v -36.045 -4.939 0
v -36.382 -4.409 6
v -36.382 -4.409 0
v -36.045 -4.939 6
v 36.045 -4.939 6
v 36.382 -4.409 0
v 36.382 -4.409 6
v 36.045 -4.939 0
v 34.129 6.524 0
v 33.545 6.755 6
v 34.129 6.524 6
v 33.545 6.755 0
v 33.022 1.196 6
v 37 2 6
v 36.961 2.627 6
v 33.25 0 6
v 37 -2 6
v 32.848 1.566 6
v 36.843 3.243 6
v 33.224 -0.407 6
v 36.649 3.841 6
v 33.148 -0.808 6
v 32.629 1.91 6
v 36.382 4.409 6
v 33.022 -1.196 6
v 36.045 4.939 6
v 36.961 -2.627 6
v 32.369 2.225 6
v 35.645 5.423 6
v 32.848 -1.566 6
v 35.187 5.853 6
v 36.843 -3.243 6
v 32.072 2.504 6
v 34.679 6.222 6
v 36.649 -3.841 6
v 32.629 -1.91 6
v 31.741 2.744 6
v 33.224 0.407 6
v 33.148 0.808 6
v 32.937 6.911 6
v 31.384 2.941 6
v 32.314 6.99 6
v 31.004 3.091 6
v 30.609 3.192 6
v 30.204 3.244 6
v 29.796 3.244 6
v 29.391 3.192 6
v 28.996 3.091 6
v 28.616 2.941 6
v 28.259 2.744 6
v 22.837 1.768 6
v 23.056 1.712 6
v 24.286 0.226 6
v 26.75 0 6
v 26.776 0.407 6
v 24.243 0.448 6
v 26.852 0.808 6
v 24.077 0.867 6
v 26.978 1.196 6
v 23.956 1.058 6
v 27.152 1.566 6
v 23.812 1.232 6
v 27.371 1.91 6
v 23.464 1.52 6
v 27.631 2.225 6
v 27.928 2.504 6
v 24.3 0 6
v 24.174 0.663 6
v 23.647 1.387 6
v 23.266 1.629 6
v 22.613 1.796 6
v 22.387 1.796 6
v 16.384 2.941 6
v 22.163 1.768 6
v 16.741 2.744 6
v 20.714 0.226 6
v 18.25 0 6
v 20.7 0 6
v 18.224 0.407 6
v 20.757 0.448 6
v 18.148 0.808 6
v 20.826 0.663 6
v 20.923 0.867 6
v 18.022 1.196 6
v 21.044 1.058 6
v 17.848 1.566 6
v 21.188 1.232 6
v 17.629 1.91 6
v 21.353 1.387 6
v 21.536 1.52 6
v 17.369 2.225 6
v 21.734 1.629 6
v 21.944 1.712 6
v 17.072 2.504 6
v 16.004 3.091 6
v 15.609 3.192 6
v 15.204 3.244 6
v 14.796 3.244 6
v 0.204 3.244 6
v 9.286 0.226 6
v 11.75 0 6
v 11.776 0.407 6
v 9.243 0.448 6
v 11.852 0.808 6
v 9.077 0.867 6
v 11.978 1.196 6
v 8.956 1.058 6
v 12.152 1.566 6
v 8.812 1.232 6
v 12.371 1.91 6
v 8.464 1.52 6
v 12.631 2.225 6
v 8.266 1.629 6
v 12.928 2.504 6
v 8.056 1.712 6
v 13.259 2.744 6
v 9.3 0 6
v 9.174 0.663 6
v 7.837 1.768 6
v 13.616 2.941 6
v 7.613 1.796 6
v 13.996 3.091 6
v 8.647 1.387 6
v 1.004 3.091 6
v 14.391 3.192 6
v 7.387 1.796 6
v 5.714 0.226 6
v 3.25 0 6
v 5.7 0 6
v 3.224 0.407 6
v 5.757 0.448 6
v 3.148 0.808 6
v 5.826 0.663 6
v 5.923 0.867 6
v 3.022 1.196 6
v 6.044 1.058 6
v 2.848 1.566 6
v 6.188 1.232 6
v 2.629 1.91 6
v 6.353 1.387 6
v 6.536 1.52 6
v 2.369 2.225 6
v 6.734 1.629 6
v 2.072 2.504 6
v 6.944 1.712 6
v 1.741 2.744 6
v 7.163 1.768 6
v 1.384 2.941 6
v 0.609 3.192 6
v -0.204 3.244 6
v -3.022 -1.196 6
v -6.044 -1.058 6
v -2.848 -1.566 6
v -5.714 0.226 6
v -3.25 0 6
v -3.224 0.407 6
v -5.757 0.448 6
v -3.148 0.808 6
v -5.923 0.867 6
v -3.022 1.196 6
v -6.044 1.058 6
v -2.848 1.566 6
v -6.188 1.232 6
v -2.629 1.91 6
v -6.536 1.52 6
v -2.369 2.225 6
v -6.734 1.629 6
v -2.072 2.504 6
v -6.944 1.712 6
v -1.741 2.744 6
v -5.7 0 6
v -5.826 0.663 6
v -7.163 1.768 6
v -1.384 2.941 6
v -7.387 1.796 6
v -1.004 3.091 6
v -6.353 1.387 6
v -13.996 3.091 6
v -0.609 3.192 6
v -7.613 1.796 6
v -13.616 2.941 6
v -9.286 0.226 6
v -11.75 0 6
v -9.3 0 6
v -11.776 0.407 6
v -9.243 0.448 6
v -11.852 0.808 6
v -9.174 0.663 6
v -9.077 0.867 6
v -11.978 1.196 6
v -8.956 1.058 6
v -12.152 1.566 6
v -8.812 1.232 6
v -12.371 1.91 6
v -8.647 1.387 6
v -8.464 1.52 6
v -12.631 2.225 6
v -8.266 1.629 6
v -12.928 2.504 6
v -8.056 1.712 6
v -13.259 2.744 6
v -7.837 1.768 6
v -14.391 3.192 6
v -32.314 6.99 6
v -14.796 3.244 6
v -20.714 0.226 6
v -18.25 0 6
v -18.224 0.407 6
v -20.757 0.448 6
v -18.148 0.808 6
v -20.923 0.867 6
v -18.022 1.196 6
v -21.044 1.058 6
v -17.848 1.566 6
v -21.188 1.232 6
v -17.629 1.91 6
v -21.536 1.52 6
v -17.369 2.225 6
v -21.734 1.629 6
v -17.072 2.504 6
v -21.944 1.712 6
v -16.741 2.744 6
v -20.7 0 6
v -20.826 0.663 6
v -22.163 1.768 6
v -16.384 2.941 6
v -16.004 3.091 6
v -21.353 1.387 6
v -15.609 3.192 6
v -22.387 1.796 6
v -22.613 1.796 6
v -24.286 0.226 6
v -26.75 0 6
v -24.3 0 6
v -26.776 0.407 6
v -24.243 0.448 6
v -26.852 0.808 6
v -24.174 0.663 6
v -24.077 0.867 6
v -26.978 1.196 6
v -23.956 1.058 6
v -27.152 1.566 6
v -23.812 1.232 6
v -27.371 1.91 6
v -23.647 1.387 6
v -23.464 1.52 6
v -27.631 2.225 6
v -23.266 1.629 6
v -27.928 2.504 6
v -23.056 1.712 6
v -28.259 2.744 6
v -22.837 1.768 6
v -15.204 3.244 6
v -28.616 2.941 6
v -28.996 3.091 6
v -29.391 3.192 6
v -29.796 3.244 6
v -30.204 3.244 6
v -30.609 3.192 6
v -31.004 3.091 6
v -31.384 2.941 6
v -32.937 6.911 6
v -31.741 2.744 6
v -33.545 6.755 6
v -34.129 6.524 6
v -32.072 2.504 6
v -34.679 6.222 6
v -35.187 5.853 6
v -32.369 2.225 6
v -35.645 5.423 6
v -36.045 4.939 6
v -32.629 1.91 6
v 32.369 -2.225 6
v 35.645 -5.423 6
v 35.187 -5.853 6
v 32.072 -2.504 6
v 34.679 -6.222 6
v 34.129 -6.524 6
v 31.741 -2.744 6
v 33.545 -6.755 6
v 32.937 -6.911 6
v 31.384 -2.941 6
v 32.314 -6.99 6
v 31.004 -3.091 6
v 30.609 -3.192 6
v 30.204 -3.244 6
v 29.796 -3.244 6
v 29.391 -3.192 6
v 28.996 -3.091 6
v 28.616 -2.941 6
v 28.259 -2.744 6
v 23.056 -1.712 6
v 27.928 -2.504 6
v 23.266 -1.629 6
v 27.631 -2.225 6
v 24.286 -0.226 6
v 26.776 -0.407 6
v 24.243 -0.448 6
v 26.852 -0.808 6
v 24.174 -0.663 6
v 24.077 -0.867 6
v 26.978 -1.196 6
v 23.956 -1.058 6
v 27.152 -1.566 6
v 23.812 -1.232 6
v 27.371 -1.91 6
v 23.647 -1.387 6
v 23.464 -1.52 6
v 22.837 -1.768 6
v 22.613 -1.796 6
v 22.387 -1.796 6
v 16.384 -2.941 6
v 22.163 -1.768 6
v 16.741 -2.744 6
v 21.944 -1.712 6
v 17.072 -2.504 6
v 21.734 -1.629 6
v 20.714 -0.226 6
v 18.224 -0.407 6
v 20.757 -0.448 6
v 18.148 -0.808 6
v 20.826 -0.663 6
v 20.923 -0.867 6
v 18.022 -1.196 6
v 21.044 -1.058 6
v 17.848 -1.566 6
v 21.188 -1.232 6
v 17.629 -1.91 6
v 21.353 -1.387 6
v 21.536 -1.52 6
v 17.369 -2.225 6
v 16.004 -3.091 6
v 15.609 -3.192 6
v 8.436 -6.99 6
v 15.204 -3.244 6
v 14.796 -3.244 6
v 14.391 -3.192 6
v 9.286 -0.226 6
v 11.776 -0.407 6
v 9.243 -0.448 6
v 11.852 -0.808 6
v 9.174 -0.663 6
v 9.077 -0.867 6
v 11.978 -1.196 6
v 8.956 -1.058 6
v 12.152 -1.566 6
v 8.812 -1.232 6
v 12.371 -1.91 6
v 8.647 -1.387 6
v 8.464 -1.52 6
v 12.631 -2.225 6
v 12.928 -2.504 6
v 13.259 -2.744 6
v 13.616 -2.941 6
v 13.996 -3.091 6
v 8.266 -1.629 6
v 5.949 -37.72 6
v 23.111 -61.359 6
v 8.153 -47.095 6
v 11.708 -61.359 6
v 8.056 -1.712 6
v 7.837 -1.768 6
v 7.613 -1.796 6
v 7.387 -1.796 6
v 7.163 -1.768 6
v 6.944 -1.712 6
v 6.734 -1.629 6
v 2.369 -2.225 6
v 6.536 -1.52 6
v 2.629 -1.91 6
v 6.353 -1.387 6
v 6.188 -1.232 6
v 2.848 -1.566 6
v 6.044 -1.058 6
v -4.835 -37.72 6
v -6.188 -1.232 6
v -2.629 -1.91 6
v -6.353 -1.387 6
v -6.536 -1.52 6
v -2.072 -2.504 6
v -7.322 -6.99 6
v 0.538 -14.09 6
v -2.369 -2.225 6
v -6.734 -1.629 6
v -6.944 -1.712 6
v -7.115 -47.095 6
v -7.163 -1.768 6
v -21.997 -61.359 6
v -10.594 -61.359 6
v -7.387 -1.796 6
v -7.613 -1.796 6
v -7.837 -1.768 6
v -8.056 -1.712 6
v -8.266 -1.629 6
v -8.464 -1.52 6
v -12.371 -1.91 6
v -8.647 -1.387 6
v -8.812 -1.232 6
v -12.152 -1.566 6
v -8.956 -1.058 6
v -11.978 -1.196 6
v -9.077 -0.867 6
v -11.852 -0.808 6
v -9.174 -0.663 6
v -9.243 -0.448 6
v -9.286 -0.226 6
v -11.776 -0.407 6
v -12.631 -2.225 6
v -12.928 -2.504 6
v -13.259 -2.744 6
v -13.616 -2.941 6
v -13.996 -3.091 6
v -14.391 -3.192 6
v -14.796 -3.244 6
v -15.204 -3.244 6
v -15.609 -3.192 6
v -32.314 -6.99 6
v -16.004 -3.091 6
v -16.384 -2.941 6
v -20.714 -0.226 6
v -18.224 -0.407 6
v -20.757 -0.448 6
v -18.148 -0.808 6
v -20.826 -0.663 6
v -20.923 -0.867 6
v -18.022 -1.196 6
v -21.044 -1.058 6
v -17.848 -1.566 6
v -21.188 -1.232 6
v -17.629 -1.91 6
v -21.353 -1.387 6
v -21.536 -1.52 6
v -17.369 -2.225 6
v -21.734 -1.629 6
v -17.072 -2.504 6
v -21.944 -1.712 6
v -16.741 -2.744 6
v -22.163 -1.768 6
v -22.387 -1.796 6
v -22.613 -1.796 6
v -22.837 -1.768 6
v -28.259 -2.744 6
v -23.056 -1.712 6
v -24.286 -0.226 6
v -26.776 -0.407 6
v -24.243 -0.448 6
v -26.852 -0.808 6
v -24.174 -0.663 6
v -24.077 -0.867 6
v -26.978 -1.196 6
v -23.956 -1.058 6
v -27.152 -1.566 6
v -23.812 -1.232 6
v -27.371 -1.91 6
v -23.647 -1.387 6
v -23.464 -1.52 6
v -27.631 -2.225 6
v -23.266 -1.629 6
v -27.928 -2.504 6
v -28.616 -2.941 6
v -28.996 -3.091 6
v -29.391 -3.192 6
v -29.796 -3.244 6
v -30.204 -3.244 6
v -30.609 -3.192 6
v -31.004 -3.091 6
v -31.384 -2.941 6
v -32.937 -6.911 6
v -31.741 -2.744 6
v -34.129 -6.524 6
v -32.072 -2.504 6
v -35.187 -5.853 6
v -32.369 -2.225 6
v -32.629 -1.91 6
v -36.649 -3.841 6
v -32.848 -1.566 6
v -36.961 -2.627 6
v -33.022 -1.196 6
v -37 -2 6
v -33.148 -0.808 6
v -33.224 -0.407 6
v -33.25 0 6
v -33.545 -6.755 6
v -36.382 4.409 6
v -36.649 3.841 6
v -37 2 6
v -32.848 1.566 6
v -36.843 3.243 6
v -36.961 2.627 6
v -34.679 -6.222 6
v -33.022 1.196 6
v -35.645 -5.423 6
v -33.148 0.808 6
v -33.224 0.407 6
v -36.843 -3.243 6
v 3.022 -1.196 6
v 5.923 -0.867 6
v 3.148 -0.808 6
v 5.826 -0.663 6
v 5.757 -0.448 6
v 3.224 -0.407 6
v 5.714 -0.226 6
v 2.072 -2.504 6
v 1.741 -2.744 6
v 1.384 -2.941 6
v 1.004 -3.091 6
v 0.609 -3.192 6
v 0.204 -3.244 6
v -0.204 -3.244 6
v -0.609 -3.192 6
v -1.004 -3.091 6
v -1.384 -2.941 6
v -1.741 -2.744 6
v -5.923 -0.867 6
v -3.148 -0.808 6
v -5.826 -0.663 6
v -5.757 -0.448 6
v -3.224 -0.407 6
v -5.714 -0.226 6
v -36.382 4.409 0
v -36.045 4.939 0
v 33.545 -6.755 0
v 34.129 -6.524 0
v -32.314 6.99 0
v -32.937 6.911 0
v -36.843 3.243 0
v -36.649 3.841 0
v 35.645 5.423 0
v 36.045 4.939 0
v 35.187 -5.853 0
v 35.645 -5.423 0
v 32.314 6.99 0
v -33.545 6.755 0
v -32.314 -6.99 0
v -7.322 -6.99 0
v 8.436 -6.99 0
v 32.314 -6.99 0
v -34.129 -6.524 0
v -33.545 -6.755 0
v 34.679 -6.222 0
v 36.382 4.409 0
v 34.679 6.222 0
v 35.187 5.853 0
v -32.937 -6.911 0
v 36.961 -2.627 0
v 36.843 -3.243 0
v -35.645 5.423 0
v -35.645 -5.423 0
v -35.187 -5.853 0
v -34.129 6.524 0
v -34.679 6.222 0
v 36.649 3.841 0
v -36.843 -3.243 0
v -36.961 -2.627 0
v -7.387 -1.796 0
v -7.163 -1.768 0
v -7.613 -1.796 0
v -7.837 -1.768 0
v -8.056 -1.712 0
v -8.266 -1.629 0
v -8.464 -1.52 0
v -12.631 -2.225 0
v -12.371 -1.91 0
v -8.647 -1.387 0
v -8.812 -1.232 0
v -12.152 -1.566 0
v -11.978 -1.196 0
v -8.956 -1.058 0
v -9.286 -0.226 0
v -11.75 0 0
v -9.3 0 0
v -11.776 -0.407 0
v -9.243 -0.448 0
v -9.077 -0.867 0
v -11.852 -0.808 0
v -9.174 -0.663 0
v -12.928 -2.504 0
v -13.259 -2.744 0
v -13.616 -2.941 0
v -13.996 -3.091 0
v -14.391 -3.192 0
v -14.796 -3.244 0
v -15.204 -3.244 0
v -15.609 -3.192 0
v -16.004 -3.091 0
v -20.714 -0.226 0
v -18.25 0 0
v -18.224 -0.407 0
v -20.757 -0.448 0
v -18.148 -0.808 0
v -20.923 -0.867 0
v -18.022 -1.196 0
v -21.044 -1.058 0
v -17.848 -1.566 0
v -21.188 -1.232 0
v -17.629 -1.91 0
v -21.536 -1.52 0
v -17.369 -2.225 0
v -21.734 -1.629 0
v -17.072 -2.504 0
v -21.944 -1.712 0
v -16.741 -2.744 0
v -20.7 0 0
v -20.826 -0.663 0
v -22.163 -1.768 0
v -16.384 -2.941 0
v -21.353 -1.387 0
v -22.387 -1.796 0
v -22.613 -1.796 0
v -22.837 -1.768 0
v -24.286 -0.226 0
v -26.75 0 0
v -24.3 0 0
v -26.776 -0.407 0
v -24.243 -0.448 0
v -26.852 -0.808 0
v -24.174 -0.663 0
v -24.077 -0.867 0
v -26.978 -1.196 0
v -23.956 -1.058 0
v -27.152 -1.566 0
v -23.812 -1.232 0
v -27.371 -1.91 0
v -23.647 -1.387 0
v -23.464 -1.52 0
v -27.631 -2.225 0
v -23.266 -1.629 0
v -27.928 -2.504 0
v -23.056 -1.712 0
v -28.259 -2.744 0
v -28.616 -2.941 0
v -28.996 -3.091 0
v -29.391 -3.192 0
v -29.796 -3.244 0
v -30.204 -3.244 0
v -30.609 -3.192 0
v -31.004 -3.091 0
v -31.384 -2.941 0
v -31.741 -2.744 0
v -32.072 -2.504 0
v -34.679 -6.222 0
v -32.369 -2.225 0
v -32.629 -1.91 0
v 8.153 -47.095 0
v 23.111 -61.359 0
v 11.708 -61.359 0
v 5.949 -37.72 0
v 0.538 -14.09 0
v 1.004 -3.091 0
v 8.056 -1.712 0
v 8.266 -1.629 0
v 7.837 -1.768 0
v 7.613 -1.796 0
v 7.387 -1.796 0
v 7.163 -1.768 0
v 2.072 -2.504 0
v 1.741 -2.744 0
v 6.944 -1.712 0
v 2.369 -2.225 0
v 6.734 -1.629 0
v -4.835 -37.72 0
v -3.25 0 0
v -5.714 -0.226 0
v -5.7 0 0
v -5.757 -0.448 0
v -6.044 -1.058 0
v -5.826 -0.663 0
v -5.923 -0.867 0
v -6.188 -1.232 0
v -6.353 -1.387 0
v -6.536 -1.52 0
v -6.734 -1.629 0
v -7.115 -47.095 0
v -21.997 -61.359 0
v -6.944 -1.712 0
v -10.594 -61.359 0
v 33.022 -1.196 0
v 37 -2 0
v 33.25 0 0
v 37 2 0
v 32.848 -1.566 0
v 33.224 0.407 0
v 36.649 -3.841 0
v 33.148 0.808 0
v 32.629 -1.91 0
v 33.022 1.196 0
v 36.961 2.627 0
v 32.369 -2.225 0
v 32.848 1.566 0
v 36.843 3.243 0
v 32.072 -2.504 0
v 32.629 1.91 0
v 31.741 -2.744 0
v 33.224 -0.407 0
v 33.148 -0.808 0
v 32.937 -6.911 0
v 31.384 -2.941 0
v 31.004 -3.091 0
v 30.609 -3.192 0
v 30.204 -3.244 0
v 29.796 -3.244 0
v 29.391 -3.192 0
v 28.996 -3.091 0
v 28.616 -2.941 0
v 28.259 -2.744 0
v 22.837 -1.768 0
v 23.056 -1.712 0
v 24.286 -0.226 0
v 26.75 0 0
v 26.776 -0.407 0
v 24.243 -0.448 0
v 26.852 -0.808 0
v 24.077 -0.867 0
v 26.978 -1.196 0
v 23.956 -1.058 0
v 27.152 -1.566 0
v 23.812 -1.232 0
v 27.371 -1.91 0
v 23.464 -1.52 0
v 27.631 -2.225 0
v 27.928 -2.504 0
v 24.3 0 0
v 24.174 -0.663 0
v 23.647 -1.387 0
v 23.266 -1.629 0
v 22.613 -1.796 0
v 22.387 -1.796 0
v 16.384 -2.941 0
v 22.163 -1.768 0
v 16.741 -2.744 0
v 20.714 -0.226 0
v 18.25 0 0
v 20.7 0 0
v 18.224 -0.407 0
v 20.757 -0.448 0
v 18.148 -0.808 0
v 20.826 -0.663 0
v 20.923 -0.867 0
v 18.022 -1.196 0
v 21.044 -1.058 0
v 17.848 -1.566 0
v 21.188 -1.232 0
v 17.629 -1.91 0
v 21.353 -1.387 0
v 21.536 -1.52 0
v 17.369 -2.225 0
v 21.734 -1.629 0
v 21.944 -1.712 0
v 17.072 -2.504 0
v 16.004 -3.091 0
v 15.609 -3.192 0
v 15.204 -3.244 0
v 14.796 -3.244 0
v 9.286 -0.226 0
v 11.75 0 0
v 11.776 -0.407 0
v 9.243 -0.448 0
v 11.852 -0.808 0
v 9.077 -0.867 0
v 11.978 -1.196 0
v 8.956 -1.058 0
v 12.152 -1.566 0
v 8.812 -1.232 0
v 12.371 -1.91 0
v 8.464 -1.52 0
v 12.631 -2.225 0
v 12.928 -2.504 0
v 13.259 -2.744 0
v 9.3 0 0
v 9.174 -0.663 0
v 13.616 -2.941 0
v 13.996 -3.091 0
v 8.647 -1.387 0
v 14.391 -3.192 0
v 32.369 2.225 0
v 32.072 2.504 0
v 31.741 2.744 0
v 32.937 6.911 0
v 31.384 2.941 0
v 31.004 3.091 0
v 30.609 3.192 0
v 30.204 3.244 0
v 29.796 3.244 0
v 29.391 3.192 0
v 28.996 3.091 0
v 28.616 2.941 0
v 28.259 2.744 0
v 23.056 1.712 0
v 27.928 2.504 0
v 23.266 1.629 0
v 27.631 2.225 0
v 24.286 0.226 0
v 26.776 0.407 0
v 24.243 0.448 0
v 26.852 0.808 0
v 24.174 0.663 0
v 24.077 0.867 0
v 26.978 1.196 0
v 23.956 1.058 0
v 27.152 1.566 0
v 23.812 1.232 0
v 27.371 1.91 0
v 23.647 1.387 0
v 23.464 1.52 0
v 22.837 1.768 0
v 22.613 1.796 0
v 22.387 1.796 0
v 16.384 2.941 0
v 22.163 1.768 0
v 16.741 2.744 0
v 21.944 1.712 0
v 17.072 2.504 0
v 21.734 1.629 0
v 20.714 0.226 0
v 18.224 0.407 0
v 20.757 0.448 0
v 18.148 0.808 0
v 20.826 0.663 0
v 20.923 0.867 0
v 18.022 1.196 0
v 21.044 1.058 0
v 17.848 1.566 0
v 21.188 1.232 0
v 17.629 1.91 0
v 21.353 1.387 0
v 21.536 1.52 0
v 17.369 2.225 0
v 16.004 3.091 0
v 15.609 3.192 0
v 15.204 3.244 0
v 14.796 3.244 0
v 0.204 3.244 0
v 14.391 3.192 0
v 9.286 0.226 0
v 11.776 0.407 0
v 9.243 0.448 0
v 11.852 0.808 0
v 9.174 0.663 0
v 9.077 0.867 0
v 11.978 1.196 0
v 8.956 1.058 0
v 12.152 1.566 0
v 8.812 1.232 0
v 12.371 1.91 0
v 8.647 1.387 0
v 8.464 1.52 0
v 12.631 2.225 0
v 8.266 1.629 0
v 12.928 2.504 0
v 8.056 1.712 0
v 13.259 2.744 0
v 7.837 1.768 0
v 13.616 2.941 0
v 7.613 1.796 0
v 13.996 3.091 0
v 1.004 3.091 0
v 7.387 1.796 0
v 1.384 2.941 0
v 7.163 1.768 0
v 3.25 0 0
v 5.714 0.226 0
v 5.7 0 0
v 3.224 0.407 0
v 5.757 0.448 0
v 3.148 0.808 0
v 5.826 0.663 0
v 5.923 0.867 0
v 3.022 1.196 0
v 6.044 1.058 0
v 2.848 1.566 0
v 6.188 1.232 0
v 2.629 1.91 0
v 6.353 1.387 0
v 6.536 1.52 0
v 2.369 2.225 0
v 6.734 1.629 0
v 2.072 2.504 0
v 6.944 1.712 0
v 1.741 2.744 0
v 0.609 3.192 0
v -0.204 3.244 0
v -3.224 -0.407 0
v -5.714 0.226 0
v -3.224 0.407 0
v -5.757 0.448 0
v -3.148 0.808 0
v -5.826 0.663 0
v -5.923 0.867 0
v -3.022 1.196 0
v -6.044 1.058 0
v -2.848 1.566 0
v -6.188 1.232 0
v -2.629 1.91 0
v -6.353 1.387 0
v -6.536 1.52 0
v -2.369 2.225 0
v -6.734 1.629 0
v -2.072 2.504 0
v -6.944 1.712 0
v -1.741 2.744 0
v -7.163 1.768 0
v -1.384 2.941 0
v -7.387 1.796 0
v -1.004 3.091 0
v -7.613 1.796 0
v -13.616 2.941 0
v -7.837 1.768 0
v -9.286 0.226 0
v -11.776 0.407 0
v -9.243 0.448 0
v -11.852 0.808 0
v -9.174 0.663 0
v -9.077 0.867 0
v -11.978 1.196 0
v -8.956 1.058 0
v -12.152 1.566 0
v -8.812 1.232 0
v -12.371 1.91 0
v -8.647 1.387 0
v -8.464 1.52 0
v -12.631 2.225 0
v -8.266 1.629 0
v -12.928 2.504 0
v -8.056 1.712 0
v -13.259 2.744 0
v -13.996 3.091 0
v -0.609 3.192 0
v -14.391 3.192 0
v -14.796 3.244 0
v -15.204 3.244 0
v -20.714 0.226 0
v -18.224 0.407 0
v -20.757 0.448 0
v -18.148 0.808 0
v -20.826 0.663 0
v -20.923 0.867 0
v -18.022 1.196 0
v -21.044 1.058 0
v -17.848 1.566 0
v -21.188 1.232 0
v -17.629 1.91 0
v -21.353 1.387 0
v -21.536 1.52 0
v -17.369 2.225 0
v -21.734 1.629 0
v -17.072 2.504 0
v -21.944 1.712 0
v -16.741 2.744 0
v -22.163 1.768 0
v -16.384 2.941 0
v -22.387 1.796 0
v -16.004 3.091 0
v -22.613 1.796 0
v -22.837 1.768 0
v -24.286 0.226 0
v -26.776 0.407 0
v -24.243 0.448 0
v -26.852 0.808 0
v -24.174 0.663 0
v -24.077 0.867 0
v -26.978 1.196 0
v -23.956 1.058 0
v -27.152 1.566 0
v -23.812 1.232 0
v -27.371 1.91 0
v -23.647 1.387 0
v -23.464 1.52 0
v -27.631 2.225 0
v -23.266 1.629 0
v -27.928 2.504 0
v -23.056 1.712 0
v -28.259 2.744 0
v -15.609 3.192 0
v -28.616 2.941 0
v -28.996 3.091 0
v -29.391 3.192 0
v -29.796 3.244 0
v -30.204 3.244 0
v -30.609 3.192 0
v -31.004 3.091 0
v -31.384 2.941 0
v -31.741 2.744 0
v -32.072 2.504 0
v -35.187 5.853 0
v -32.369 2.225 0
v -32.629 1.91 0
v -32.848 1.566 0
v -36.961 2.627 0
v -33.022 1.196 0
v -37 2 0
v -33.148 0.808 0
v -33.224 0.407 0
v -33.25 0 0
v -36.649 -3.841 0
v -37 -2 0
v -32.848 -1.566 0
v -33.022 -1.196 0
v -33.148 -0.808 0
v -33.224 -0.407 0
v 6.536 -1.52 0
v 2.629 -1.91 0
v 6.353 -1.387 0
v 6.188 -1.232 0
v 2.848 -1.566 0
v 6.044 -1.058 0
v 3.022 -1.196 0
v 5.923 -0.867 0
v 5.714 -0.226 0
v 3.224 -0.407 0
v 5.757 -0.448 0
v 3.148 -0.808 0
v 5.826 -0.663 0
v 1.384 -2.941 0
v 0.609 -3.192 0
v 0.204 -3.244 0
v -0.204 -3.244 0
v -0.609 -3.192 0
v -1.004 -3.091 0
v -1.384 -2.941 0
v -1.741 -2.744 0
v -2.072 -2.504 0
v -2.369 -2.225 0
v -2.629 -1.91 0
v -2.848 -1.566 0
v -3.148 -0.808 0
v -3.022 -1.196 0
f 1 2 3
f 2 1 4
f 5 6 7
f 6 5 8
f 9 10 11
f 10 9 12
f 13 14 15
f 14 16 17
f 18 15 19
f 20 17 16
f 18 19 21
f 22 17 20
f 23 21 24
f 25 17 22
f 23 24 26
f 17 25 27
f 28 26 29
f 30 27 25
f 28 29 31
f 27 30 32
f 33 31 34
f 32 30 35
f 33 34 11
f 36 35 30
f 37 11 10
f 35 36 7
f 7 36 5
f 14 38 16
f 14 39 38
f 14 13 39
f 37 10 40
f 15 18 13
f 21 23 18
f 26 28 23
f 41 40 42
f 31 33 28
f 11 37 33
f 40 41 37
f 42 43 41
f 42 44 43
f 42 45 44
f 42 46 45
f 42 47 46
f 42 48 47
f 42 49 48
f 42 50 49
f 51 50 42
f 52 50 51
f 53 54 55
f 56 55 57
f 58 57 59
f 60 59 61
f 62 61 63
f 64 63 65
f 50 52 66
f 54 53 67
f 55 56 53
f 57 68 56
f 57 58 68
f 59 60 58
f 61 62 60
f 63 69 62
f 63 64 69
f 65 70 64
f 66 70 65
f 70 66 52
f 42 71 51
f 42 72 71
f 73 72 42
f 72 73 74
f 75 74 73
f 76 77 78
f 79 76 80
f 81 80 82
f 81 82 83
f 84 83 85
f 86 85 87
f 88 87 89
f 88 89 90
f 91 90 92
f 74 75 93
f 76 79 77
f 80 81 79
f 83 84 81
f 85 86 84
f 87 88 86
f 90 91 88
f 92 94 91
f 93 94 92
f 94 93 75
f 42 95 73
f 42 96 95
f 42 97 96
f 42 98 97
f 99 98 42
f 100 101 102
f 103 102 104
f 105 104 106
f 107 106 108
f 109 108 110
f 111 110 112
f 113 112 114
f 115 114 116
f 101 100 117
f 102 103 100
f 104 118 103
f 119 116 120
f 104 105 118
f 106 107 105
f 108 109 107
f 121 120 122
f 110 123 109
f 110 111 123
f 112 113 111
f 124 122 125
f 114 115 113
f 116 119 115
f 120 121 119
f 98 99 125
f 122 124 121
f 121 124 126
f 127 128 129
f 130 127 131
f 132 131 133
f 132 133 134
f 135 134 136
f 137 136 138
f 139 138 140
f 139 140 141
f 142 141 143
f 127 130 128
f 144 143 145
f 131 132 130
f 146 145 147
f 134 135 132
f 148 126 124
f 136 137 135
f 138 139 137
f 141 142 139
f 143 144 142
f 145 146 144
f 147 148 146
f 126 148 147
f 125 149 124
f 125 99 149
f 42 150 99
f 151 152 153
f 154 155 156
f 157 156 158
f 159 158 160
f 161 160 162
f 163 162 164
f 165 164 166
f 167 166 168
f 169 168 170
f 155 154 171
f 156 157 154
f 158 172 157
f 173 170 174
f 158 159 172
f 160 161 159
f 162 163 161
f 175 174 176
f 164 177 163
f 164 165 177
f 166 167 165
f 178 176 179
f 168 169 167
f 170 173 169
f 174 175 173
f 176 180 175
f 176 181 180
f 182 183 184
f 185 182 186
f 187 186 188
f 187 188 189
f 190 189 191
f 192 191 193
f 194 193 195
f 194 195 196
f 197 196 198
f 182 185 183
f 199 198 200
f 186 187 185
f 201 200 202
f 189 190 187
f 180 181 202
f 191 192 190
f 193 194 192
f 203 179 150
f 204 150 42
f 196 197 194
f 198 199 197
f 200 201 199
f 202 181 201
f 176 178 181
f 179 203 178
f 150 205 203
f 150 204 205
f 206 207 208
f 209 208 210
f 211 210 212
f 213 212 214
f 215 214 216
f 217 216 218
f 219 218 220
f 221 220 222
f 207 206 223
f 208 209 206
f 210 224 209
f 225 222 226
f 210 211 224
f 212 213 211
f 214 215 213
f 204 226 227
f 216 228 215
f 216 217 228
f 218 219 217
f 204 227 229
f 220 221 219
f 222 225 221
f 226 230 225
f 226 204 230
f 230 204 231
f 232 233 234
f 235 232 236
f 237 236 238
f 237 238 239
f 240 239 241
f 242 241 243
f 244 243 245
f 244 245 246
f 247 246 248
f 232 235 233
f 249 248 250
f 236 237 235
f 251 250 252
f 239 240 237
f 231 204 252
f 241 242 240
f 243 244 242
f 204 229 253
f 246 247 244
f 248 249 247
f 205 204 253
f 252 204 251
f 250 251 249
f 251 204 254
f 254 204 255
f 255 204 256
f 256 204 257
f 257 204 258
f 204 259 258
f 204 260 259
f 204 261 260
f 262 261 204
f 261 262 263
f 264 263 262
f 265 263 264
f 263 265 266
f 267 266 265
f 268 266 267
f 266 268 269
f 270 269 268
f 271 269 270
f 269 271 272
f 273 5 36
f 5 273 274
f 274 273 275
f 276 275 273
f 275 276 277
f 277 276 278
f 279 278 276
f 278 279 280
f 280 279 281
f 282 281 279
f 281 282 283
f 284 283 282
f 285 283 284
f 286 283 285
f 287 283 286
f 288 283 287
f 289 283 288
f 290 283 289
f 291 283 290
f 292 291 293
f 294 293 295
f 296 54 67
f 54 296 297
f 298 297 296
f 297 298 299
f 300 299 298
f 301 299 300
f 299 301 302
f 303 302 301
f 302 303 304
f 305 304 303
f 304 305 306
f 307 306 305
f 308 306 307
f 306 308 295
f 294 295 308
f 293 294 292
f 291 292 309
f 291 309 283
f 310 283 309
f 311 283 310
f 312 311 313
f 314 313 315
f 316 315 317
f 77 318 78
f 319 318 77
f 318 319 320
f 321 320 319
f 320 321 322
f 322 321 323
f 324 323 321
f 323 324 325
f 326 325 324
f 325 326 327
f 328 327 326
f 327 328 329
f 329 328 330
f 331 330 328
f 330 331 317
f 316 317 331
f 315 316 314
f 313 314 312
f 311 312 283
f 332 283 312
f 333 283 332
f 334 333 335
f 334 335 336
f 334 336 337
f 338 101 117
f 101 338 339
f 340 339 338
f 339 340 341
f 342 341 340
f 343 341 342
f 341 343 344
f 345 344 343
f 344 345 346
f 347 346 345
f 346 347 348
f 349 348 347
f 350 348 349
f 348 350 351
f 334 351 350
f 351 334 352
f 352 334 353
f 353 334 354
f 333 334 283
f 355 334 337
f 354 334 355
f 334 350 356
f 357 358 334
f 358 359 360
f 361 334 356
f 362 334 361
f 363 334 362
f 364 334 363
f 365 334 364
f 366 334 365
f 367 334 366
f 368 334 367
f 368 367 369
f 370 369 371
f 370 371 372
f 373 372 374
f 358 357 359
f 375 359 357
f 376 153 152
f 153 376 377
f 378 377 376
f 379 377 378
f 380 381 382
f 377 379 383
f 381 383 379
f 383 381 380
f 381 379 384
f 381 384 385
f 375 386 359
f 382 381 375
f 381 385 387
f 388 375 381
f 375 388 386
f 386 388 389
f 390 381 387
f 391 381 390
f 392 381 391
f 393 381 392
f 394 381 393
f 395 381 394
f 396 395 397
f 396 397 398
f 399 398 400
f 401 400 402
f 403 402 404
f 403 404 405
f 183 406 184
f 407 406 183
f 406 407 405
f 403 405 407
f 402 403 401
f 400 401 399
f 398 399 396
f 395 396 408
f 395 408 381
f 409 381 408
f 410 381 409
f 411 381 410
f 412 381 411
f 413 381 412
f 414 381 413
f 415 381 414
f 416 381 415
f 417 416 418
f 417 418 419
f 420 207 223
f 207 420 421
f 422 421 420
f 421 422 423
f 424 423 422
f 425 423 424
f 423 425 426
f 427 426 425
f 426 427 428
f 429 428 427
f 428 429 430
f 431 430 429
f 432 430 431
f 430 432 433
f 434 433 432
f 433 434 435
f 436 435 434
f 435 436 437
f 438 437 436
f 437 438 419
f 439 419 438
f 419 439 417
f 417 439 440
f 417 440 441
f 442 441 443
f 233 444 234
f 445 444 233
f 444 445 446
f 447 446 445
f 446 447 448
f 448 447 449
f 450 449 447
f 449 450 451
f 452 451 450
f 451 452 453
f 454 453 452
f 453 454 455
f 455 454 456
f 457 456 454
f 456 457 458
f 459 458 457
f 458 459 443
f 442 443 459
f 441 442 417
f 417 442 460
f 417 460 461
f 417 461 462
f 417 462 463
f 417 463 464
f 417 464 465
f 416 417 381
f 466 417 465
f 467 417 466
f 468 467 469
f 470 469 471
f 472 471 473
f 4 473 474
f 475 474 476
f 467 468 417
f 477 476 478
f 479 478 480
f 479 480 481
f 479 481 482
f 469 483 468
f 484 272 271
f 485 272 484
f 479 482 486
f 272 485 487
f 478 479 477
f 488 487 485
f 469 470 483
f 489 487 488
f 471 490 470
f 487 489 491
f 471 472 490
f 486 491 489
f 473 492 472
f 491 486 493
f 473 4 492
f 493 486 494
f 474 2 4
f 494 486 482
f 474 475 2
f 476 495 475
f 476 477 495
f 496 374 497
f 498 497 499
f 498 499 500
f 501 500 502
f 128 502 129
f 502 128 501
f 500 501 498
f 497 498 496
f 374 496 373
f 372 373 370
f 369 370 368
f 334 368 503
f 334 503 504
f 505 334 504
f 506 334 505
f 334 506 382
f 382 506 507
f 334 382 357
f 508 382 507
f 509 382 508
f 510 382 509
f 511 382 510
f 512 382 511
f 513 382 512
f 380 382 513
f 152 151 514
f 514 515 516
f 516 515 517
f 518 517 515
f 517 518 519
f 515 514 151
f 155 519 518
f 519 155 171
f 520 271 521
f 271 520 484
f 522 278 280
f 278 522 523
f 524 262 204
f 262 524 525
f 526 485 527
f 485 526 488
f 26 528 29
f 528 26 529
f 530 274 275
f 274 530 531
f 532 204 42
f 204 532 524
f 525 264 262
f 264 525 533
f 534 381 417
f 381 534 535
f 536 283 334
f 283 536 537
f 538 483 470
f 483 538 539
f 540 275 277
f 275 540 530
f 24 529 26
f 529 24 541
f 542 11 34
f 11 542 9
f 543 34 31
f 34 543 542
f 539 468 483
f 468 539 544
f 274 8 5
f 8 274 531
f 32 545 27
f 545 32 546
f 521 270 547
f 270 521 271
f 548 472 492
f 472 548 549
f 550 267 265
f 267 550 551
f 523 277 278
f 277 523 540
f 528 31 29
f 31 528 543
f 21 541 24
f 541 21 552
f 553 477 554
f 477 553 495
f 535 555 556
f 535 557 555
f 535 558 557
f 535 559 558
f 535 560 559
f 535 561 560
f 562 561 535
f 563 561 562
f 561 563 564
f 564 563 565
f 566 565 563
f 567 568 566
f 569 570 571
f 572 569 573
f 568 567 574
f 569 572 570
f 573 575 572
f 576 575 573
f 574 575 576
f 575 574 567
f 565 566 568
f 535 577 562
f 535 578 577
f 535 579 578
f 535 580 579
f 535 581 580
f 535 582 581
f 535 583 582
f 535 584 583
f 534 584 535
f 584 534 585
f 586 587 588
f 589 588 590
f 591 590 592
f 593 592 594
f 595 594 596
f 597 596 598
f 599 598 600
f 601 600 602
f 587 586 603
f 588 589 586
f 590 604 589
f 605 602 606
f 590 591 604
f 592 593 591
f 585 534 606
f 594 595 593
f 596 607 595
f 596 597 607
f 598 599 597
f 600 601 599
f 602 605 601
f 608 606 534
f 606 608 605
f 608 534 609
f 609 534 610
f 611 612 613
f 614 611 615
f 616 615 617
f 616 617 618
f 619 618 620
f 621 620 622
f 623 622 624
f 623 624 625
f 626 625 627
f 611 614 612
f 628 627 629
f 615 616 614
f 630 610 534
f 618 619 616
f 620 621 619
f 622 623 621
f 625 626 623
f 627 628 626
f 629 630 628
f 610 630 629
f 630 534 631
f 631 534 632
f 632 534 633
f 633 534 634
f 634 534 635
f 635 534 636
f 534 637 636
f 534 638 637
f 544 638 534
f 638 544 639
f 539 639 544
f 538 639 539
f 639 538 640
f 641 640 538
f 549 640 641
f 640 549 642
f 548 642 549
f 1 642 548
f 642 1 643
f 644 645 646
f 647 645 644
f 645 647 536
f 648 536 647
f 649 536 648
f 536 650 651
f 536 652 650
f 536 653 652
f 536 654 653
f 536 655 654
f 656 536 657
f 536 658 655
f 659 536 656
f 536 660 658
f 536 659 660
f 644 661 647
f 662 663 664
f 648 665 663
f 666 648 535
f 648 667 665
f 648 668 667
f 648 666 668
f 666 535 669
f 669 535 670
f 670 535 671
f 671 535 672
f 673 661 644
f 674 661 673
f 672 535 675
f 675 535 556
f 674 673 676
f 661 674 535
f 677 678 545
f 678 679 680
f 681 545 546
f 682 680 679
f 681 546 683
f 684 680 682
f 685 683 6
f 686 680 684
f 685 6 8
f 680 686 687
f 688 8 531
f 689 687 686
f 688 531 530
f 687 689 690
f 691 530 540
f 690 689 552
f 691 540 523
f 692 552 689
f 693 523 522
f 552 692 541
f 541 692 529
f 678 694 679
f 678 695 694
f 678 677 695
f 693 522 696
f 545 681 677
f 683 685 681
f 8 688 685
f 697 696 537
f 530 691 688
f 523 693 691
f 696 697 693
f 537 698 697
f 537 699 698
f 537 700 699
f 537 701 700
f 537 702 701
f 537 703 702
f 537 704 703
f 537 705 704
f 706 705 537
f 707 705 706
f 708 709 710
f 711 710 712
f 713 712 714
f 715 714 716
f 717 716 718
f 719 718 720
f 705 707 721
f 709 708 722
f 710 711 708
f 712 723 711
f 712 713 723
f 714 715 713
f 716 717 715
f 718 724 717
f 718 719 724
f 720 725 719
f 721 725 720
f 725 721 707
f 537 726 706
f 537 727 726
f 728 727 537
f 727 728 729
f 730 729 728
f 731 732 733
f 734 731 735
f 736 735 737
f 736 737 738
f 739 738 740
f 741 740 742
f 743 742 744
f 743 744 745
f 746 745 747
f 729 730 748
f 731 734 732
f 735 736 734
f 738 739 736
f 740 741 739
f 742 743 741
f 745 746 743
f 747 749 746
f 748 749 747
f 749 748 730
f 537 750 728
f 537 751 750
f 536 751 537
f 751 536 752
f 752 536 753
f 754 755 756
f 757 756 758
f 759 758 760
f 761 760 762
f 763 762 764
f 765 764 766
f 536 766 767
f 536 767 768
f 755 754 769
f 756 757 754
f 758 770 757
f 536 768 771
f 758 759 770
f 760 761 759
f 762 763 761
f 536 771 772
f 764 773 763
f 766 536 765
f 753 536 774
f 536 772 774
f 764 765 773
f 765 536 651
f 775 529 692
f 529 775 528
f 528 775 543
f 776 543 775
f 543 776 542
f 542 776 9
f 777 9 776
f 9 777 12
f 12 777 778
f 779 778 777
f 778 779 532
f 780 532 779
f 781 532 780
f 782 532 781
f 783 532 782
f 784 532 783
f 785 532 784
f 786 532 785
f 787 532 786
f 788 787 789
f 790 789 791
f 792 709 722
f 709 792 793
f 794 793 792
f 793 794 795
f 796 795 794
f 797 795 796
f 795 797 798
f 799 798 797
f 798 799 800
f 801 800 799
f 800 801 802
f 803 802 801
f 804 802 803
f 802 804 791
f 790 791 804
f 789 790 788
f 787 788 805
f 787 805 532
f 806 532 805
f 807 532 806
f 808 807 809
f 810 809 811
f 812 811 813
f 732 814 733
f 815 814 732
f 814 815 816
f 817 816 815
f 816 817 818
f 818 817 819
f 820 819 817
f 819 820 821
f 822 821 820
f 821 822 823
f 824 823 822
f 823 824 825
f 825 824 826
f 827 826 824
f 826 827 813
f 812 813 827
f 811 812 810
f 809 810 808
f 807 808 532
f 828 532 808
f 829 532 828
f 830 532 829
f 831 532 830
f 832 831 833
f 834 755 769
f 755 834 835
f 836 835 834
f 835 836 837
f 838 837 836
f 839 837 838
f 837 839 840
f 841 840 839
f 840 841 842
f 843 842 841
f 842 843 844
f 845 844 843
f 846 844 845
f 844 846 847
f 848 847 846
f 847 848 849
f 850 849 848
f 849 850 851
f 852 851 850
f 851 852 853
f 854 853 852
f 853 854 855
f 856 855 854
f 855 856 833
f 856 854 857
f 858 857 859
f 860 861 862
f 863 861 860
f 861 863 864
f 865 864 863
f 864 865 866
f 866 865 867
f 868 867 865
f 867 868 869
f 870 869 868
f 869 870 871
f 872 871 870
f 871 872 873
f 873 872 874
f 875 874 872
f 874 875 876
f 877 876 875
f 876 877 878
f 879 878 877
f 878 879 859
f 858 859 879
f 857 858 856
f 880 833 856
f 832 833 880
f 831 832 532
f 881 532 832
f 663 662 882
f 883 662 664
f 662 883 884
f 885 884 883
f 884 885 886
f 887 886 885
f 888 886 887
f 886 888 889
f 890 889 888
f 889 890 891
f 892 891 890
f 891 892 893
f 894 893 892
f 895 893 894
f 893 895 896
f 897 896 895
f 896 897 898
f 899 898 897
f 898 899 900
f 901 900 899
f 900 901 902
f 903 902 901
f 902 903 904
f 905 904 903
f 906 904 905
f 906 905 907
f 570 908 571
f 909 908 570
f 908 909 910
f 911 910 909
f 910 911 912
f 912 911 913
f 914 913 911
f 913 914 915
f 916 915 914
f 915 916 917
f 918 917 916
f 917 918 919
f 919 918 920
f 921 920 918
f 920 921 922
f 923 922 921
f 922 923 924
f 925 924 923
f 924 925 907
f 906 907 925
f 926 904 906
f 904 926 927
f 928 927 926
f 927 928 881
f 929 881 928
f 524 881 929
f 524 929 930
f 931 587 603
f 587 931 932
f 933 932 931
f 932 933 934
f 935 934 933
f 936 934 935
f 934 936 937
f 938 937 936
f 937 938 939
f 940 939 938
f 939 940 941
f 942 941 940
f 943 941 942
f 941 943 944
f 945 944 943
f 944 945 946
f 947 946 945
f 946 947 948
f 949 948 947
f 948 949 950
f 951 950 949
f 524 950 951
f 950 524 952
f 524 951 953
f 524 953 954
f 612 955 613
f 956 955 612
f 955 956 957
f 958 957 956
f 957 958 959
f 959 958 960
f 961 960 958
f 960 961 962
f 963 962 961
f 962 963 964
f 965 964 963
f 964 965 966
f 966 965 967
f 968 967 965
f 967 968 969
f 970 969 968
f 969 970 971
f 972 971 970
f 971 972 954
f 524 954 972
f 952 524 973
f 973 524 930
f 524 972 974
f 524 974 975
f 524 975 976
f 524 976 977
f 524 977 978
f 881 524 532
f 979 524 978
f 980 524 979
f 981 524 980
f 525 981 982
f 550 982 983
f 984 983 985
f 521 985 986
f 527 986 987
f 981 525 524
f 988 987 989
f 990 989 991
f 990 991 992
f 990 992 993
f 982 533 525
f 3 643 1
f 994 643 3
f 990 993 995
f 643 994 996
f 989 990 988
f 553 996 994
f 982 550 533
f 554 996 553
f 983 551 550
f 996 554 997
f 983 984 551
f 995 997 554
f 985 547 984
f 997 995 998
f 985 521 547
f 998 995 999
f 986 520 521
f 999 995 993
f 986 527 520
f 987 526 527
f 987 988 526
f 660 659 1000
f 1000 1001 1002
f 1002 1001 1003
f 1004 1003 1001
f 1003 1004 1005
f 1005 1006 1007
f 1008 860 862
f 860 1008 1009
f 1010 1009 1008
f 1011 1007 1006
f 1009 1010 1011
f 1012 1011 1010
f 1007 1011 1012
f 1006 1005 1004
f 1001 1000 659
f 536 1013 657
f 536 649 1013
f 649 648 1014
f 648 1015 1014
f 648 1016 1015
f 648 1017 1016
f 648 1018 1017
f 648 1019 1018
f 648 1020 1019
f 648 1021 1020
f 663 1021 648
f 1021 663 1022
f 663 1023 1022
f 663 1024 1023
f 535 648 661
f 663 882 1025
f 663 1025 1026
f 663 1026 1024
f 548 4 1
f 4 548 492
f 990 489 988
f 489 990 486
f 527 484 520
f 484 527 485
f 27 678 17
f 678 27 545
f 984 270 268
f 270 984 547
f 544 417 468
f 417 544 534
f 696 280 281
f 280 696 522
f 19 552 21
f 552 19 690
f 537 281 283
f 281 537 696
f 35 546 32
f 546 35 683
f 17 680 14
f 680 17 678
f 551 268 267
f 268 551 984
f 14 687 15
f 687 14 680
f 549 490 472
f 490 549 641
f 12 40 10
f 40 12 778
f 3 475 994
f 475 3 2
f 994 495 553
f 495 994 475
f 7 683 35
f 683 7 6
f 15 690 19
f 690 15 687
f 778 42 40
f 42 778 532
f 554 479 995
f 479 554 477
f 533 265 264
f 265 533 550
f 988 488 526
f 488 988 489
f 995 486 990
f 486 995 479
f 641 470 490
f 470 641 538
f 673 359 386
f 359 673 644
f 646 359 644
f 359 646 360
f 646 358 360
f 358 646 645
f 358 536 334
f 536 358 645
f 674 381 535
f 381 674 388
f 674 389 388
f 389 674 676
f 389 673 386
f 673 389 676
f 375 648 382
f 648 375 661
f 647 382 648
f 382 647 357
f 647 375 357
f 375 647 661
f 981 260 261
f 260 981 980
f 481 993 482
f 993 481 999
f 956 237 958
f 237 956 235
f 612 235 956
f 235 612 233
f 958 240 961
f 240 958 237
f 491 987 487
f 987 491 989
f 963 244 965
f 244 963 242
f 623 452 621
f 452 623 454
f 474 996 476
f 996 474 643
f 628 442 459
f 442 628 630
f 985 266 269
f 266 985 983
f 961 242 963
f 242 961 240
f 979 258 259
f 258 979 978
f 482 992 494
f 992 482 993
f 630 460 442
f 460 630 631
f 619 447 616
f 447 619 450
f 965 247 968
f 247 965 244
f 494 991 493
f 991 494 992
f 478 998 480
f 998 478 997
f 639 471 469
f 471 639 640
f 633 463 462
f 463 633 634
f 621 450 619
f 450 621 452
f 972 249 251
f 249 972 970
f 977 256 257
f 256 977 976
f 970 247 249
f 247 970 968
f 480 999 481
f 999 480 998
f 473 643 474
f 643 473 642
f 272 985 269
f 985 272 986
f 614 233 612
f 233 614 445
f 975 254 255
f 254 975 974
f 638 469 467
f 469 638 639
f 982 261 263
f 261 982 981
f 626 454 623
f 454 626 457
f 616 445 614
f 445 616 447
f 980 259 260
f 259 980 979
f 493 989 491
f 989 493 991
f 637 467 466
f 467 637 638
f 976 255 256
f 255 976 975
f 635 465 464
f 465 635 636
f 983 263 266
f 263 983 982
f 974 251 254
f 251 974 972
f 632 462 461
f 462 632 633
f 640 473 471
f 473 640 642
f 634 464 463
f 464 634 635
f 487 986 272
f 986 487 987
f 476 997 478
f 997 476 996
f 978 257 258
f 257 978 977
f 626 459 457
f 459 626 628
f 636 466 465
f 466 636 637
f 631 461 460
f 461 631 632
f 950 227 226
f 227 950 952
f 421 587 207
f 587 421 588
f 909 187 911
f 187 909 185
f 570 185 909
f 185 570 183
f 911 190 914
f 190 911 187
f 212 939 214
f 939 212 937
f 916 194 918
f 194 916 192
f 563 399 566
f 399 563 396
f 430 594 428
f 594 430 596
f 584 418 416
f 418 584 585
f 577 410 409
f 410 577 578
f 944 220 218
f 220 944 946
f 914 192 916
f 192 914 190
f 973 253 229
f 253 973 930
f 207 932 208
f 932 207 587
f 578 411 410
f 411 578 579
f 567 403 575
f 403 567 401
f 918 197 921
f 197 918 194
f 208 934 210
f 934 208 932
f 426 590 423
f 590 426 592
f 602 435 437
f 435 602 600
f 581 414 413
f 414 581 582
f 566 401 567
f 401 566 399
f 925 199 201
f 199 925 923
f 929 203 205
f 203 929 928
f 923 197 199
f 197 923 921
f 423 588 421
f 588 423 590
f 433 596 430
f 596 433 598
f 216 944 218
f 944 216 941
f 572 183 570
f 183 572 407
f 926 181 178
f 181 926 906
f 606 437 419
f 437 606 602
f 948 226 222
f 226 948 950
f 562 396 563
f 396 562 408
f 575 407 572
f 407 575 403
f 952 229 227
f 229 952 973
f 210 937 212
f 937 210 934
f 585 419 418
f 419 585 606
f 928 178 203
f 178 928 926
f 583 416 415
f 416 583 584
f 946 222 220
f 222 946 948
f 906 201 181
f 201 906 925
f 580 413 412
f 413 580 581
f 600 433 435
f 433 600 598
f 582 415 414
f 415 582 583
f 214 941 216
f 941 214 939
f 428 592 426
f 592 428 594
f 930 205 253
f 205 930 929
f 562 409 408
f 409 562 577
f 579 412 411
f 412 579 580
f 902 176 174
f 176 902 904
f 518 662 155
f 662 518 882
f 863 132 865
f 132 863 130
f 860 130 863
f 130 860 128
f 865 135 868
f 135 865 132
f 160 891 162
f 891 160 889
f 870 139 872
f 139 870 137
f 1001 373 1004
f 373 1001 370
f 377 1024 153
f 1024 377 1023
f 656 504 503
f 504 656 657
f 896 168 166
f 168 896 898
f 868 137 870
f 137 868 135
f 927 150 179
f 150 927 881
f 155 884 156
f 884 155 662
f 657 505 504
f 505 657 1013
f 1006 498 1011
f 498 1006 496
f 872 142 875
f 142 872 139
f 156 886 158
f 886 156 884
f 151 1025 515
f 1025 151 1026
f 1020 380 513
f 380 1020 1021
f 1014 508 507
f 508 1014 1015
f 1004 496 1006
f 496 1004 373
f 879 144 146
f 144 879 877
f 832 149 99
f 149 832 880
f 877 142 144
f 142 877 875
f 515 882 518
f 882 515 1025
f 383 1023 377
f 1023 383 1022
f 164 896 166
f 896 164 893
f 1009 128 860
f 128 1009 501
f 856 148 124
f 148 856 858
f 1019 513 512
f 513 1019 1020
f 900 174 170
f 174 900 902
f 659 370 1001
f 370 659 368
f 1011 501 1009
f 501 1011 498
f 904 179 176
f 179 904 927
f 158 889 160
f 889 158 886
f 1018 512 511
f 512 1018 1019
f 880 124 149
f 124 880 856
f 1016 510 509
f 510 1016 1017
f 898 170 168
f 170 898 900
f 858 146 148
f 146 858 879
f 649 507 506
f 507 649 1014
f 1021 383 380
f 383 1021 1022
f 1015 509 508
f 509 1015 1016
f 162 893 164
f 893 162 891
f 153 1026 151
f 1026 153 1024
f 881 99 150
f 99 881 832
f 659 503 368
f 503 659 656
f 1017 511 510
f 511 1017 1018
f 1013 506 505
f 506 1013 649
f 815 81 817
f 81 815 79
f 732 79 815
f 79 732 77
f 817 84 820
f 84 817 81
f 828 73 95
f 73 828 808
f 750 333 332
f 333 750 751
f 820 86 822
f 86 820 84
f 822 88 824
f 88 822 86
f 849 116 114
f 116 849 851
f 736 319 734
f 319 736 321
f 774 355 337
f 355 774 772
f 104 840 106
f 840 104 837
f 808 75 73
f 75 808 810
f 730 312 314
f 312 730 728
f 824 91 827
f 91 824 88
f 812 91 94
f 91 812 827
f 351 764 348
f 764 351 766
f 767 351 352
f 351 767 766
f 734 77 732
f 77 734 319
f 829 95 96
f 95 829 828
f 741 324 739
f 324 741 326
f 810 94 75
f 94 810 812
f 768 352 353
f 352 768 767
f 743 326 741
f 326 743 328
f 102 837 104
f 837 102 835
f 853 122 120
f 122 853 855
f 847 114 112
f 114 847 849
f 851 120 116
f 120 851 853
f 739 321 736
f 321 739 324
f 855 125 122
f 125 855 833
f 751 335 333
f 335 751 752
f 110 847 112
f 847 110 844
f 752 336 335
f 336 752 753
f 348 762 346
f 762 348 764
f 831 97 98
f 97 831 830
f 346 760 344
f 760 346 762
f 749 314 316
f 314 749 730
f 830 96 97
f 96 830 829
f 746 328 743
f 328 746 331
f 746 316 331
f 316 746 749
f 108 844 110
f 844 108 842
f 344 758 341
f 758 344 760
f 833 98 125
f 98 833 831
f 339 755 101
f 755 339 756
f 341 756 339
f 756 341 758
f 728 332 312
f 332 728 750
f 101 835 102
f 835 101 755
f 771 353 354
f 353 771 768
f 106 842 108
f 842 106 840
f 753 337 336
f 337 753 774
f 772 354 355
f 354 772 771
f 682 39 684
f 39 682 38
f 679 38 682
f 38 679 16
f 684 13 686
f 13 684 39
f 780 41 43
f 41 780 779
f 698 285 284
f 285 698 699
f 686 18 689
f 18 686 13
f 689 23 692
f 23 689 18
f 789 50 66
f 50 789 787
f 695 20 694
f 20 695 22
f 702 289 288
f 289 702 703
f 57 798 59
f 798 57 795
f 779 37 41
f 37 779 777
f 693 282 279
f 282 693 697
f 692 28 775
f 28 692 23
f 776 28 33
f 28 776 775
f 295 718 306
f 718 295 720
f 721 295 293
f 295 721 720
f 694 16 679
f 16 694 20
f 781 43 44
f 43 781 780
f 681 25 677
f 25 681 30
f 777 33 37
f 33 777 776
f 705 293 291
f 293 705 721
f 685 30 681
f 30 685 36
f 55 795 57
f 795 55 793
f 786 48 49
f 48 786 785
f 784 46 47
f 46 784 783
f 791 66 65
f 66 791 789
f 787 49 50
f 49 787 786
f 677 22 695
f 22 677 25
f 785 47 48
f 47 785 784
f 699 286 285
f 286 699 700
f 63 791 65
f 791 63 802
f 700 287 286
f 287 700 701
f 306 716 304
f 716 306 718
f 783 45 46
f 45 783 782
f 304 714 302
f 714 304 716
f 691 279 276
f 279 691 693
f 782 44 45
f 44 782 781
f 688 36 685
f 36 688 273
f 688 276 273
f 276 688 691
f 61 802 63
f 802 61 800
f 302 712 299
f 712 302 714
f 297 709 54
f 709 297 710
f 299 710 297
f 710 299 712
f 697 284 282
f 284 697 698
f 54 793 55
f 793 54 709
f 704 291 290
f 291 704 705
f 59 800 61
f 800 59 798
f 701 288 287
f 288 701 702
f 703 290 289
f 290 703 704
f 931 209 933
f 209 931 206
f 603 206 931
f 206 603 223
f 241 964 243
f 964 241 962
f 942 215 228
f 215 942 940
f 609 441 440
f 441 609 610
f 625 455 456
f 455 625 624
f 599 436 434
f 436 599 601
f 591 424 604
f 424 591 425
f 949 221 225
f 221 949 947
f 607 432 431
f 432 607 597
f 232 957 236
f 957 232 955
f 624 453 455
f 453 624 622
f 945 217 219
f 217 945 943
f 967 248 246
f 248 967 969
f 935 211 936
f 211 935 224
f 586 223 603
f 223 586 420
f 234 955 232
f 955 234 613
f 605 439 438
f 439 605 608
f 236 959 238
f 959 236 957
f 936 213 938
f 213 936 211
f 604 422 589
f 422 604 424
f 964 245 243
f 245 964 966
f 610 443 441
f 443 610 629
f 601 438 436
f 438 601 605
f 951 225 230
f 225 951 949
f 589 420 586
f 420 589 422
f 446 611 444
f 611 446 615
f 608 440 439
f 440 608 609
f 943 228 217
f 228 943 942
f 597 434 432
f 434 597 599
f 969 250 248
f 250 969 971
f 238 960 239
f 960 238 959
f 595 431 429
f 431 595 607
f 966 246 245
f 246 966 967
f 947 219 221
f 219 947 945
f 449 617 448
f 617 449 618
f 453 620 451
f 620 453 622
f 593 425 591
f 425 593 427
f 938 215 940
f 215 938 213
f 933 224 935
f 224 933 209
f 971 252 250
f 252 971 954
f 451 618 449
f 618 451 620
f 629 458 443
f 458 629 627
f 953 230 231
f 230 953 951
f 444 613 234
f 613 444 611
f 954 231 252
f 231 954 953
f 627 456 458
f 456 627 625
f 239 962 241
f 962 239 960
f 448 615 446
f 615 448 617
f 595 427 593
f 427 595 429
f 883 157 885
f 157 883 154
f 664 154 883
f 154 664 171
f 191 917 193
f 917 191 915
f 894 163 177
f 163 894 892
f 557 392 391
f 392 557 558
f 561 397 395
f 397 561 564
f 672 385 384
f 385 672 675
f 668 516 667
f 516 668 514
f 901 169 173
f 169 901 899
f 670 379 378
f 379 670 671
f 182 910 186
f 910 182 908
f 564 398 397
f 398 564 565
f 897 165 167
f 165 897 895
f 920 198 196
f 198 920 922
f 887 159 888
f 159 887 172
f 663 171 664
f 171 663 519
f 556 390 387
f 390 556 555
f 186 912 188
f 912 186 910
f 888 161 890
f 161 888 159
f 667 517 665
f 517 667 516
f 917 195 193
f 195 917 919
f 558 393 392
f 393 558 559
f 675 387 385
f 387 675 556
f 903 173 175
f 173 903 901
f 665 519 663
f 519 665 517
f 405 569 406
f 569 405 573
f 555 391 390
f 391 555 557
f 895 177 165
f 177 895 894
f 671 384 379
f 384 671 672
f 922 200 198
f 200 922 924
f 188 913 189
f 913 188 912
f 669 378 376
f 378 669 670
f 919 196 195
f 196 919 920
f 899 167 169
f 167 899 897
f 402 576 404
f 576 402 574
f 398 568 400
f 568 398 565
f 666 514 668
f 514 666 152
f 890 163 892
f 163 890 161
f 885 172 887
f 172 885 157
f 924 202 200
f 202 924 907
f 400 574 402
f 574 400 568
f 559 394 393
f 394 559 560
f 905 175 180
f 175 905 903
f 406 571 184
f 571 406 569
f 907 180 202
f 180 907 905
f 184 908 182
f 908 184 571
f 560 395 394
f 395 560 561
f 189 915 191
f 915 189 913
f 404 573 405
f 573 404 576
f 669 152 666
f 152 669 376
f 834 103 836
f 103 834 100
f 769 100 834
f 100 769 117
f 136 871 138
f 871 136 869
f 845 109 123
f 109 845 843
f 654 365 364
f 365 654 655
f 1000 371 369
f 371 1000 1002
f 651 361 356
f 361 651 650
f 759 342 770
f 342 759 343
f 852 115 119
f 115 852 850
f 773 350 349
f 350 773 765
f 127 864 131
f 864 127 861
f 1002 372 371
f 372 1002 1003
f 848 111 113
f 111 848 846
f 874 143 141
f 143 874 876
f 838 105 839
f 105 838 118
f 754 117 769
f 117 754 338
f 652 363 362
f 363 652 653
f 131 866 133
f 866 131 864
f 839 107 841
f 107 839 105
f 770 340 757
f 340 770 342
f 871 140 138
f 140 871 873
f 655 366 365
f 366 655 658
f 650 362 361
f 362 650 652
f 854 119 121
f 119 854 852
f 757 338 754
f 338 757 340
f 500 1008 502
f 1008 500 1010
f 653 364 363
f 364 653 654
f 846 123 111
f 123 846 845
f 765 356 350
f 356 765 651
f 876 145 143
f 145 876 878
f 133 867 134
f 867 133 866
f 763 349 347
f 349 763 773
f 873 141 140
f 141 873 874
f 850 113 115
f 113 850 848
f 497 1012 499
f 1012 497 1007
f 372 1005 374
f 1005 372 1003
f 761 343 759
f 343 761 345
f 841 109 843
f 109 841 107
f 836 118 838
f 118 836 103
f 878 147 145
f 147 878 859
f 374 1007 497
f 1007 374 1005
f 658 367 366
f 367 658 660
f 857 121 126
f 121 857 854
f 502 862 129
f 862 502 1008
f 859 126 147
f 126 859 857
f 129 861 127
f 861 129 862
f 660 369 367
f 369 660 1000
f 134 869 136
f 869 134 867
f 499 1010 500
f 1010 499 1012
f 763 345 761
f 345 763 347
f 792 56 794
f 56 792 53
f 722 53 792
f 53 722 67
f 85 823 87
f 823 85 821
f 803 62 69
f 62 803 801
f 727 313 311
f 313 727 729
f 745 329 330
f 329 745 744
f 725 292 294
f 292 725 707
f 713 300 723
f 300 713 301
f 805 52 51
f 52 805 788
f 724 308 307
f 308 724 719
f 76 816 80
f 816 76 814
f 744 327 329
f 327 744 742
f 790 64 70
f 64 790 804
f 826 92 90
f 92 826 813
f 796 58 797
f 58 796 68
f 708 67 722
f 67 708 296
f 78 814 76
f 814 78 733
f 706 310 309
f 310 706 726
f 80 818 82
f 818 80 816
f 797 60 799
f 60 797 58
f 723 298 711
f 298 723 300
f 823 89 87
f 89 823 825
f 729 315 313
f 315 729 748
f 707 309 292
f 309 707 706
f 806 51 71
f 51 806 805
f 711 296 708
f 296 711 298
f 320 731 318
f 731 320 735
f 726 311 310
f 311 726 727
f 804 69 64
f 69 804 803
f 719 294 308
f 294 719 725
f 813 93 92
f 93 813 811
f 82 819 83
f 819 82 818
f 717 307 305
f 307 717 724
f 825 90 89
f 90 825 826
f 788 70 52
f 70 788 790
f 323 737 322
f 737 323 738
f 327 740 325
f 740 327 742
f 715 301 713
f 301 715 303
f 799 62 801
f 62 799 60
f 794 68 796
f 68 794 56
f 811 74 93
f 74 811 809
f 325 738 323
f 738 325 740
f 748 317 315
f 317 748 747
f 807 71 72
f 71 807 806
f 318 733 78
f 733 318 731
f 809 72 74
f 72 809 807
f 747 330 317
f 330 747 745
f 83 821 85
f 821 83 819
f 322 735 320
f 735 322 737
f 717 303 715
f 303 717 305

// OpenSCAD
$fn = 50;


difference() {
	union() {
		hull() {
			translate(v = [-32.0000000000, 2.0000000000, 0]) {
				cylinder(h = 6, r = 5);
			}
			translate(v = [32.0000000000, 2.0000000000, 0]) {
				cylinder(h = 6, r = 5);
			}
			translate(v = [-32.0000000000, -2.0000000000, 0]) {
				cylinder(h = 6, r = 5);
			}
			translate(v = [32.0000000000, -2.0000000000, 0]) {
				cylinder(h = 6, r = 5);
			}
		}
		translate(v = [0, -5, 0]) {
			linear_extrude(height = 6) {
				text(font = "DejaVu Sans Mono:style=Bold", halign = "center", size = 57.0000000000, text = "A", valign = "top");
			}
		}
	}
	union() {
		translate(v = [-30.0000000000, 0.0000000000, 0]) {
			translate(v = [0, 0, -100]) {
				cylinder(h = 200, r = 3.2500000000);
			}
		}
		translate(v = [-15.0000000000, 0.0000000000, 0]) {
			translate(v = [0, 0, -100]) {
				cylinder(h = 200, r = 3.2500000000);
			}
		}
		translate(v = [0, 0, -100]) {
			cylinder(h = 200, r = 3.2500000000);
		}
		translate(v = [15.0000000000, 0.0000000000, 0]) {
			translate(v = [0, 0, -100]) {
				cylinder(h = 200, r = 3.2500000000);
			}
		}
		translate(v = [30.0000000000, 0.0000000000, 0]) {
			translate(v = [0, 0, -100]) {
				cylinder(h = 200, r = 3.2500000000);
			}
		}
		translate(v = [-30.0000000000, 0.0000000000, 0]) {
			translate(v = [0, 0, -100]) {
				cylinder(h = 200, r = 1.8000000000);
			}
		}
		translate(v = [-22.5000000000, 0.0000000000, 0]) {
			translate(v = [0, 0, -100]) {
				cylinder(h = 200, r = 1.8000000000);
			}
		}
		translate(v = [-15.0000000000, 0.0000000000, 0]) {
			translate(v = [0, 0, -100]) {
				cylinder(h = 200, r = 1.8000000000);
			}
		}
		translate(v = [-7.5000000000, 0.0000000000, 0]) {
			translate(v = [0, 0, -100]) {
				cylinder(h = 200, r = 1.8000000000);
			}
		}
		translate(v = [0, 0, -100]) {
			cylinder(h = 200, r = 1.8000000000);
		}
		translate(v = [7.5000000000, 0.0000000000, 0]) {
			translate(v = [0, 0, -100]) {
				cylinder(h = 200, r = 1.8000000000);
			}
		}
		translate(v = [15.0000000000, 0.0000000000, 0]) {
			translate(v = [0, 0, -100]) {
				cylinder(h = 200, r = 1.8000000000);
			}
		}
		translate(v = [22.5000000000, 0.0000000000, 0]) {
			translate(v = [0, 0, -100]) {
				cylinder(h = 200, r = 1.8000000000);
			}
		}
		translate(v = [30.0000000000, 0.0000000000, 0]) {
			translate(v = [0, 0, -100]) {
				cylinder(h = 200, r = 1.8000000000);
			}
		}
	}
}
